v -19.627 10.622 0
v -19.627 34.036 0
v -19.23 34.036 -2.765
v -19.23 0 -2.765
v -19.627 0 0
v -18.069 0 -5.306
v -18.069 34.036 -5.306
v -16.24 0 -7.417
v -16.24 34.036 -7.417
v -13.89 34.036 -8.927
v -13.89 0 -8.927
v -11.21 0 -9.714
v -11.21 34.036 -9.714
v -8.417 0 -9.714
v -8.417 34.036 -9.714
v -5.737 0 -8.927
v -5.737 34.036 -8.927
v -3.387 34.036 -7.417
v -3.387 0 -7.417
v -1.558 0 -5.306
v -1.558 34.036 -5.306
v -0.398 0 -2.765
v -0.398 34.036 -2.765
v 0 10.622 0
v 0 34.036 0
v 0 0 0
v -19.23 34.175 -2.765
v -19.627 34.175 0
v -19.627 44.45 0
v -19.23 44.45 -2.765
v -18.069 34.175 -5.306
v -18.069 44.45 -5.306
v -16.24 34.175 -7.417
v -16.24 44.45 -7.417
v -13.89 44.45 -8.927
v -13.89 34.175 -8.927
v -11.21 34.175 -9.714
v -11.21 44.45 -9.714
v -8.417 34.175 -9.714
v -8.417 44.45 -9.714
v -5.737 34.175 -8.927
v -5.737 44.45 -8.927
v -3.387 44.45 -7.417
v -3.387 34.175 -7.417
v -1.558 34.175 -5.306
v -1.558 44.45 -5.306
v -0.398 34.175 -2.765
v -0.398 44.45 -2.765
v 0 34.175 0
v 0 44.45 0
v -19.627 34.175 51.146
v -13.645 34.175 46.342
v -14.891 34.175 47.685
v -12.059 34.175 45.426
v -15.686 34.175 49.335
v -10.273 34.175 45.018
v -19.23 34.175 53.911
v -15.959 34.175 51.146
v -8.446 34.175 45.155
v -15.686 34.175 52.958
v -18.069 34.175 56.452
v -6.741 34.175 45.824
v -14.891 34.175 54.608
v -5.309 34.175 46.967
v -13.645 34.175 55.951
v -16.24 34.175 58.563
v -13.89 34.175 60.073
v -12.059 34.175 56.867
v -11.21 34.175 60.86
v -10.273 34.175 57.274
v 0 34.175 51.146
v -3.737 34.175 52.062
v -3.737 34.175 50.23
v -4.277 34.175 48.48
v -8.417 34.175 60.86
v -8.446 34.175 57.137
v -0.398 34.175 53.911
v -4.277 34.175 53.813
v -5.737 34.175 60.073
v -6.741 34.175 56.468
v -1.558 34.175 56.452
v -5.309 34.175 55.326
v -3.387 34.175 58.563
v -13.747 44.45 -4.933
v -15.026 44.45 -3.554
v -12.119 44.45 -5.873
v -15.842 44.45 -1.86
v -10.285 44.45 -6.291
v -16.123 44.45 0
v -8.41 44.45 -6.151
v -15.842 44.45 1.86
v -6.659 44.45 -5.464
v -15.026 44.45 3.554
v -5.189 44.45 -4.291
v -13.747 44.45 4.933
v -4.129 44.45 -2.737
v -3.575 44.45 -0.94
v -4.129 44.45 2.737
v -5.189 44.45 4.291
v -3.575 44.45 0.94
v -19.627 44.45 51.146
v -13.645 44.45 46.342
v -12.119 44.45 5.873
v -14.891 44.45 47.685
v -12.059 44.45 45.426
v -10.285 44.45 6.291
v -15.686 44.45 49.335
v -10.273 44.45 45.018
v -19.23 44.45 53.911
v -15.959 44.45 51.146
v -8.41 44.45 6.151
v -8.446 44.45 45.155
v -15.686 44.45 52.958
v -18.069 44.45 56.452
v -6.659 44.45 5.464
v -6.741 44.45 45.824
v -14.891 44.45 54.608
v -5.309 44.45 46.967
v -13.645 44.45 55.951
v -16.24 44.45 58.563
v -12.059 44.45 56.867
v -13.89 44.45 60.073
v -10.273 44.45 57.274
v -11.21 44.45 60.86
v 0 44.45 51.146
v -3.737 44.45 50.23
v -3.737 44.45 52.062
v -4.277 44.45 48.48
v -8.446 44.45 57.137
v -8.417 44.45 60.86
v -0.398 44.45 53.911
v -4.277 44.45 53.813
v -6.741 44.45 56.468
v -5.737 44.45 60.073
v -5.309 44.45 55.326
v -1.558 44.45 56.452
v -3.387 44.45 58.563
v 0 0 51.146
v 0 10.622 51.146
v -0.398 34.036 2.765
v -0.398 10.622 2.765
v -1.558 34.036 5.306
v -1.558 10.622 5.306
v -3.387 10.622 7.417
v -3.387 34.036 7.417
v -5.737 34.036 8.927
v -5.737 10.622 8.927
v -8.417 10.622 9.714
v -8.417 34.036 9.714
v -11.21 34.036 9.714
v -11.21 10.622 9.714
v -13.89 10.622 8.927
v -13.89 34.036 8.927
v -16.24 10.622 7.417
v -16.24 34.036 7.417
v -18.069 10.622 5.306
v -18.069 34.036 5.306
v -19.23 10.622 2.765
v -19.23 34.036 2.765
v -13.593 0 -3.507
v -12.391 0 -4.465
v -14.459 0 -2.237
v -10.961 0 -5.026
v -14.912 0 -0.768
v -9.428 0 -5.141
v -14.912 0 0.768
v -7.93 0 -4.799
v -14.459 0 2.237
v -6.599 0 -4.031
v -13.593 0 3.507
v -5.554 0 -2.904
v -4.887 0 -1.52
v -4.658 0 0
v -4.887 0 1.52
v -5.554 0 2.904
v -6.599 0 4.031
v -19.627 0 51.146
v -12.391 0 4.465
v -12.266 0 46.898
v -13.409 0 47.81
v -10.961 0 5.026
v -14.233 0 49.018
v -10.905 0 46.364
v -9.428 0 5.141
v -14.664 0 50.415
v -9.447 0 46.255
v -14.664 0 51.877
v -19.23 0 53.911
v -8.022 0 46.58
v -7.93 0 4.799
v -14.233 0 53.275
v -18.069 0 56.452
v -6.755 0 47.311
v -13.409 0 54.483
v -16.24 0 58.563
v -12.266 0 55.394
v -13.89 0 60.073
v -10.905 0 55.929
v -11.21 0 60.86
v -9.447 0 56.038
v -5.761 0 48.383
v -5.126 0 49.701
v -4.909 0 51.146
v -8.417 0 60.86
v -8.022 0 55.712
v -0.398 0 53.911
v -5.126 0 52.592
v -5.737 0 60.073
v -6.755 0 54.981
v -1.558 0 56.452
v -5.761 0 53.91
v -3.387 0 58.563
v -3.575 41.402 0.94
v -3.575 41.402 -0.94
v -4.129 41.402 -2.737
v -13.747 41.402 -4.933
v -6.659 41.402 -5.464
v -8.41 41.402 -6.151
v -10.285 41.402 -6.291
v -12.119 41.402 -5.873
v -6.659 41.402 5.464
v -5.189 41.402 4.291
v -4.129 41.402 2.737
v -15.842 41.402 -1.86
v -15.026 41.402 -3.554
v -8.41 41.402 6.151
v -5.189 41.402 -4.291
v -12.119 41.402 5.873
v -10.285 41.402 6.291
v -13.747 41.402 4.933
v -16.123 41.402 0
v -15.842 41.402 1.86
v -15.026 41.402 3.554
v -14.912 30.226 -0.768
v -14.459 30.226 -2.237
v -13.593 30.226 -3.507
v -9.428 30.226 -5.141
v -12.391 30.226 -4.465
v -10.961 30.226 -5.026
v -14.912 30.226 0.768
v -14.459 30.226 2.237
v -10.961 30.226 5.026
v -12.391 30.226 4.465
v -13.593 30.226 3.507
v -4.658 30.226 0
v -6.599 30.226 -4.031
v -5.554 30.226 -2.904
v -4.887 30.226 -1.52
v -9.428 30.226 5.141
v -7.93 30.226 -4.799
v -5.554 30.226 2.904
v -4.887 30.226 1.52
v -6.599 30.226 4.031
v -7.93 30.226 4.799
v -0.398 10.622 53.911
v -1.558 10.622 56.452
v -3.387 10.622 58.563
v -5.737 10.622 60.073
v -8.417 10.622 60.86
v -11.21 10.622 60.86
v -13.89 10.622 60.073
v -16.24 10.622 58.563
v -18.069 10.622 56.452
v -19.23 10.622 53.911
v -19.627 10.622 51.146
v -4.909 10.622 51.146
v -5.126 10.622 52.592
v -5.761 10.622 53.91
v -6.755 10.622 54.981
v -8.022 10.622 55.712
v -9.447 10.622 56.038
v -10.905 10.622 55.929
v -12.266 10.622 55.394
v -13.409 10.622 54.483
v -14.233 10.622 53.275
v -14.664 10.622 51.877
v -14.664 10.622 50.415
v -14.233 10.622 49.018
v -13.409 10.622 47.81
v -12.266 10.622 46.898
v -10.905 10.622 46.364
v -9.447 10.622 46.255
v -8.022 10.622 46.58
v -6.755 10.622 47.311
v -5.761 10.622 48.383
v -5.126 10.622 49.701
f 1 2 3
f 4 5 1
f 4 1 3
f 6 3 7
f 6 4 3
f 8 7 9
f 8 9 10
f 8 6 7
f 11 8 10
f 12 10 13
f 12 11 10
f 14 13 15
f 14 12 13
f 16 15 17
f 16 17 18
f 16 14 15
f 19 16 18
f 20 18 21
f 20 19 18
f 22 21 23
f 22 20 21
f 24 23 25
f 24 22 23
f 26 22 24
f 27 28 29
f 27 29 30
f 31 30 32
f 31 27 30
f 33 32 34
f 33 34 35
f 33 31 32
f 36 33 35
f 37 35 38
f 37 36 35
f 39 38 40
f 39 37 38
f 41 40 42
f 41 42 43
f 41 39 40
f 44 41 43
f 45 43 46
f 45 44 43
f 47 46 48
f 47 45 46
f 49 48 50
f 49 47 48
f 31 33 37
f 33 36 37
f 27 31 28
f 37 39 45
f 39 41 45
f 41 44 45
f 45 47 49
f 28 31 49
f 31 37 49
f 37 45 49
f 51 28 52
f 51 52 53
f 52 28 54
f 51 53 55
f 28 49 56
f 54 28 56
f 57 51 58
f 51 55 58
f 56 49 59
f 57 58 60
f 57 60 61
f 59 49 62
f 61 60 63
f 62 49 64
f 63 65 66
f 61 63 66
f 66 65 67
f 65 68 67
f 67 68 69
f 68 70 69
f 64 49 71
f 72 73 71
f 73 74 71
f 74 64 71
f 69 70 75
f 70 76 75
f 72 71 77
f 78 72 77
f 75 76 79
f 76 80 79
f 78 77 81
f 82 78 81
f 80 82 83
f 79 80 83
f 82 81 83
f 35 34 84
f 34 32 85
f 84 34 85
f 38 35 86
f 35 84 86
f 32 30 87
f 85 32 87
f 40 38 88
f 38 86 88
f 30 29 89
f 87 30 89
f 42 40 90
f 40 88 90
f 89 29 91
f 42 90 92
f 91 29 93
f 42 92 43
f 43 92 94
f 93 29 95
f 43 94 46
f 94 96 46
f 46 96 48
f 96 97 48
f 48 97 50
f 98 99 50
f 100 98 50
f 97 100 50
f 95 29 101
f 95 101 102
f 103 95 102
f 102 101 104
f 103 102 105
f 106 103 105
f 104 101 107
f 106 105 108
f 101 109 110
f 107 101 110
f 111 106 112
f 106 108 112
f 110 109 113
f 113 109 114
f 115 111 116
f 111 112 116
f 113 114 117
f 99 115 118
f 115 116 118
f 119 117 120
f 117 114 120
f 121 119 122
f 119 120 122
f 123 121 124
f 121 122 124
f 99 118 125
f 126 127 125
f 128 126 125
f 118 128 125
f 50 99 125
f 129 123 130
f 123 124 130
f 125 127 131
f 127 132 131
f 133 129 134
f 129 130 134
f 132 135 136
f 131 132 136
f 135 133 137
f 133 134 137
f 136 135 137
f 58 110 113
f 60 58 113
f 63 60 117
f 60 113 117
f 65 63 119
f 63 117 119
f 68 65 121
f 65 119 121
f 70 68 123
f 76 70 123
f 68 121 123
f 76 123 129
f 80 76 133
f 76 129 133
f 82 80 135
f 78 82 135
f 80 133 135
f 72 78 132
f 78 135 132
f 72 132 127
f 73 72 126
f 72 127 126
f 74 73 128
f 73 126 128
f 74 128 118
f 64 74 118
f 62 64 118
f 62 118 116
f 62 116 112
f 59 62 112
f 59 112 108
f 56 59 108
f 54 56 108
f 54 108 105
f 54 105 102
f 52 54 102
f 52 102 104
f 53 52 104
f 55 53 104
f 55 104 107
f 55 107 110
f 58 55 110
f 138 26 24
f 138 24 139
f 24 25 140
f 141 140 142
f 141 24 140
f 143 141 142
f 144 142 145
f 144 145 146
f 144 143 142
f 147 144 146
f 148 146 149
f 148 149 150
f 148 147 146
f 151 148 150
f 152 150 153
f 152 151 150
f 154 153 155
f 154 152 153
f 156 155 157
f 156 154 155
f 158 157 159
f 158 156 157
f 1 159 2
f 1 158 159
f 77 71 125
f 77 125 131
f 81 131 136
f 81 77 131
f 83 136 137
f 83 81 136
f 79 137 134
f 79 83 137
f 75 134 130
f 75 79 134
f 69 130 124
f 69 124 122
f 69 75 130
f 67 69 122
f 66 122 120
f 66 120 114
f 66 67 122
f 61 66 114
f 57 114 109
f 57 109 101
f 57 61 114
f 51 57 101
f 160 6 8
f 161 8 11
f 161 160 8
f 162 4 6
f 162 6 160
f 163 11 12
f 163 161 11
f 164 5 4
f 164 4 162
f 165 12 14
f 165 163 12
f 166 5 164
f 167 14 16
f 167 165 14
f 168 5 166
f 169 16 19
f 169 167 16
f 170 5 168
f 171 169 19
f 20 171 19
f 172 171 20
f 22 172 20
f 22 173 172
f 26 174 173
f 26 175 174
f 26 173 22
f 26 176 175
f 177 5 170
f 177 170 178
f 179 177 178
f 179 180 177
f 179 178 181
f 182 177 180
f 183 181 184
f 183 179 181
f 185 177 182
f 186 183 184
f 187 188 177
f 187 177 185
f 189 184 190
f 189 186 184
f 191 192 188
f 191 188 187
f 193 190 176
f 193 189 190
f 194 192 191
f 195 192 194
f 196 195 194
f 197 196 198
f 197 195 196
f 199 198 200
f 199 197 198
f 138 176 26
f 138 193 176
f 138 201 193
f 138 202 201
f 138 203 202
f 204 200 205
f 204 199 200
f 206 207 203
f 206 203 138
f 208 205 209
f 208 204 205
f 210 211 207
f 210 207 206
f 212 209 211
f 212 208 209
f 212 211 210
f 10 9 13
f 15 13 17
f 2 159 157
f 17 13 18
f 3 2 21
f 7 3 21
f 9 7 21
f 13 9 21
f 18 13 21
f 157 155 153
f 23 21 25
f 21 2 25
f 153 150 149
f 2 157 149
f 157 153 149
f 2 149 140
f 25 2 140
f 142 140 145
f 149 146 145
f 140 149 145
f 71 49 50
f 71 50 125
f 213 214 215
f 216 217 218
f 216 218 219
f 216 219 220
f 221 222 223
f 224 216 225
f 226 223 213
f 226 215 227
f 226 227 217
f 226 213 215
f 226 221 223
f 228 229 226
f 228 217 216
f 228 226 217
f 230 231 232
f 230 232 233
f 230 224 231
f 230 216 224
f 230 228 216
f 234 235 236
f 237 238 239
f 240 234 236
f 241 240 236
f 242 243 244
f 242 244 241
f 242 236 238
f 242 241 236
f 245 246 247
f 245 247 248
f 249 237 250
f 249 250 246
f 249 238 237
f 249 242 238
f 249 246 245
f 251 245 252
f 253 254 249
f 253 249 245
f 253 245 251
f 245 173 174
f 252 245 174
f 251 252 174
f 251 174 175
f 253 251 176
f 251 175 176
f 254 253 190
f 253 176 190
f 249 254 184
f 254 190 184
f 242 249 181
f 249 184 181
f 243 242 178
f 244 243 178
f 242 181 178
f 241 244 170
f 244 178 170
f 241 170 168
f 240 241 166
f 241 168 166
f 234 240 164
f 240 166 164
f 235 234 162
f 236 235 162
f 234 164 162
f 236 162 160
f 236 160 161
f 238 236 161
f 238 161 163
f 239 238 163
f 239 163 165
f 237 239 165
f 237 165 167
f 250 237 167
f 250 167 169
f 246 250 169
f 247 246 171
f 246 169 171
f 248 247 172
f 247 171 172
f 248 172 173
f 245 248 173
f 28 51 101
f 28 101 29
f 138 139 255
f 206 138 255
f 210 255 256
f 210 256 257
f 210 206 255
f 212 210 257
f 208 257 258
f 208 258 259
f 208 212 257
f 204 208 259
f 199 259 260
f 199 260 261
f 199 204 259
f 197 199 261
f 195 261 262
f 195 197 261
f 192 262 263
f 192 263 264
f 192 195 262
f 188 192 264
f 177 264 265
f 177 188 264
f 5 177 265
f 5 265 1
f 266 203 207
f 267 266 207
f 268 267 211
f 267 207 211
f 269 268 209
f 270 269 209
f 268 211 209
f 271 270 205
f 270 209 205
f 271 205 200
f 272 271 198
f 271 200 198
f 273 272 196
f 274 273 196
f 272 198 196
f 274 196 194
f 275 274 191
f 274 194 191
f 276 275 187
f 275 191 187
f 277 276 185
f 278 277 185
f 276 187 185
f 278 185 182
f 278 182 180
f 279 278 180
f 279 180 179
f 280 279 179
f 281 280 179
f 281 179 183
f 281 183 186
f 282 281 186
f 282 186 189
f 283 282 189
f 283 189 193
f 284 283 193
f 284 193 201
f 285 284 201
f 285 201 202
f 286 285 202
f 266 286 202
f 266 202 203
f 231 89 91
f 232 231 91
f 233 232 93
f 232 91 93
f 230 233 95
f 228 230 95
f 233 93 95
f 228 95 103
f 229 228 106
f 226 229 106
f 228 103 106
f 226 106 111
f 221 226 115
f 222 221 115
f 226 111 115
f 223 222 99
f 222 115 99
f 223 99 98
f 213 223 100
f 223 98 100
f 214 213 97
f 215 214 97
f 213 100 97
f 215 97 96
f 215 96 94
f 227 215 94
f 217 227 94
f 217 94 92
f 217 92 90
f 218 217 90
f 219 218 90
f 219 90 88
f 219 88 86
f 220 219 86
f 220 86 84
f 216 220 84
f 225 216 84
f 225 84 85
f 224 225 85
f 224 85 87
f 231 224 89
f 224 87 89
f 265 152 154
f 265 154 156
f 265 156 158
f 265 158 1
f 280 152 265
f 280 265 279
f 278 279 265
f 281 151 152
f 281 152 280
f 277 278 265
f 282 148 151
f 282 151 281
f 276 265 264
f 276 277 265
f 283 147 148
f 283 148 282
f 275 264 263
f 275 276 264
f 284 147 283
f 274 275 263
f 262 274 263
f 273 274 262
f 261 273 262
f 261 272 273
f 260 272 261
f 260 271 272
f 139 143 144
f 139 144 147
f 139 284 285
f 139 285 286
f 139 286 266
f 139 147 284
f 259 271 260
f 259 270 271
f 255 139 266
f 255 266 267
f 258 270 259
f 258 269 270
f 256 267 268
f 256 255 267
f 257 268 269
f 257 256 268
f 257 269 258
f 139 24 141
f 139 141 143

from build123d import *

# Parameters (mm, degrees)
F1_DEPTH  = 44.45
F2_W      = 23.552729
F2_H      = 77.123636
F3_DEPTH  = 101.6
F4_R      = 4.905121
F5_DEPTH  = 74.93
F7_DEPTH  = 34.036
F8_R      = 5.155534
F9_DEPTH  = 30.226
F10_R     = 6.145174
F10_R_2   = 4.905121
F11_DEPTH = 23.622
F12_R     = 6.308934
F13_DEPTH = 3.048


with BuildPart() as f1:
    # F0 (on Front) → F1 (new body)
    with BuildSketch(Plane.XZ):
        with BuildLine():
            ThreePointArc((-19.627273, 0), (-9.813637, -9.813637), (0, 0))
            Line((0, 0), (0, 51.146362))
            ThreePointArc((0, 51.146362), (-9.813637, 60.959999), (-19.627273, 51.146362))
            Line((-19.627273, 51.146362), (-19.627273, 0))
        make_face()
    extrude(amount=-F1_DEPTH)

    # F2 (on Right) → F3 (cut)
    with BuildSketch(Plane.YZ):
        with Locations((22.398182, 25.515455)):
            Rectangle(F2_W, F2_H)
    extrude(amount=-F3_DEPTH, mode=Mode.SUBTRACT)

    # F4 (on face) → F5 (cut)
    with BuildSketch(Plane.XZ):
        with Locations((-9.813637, 51.146362)):
            Circle(F4_R)
    extrude(amount=-F5_DEPTH, mode=Mode.SUBTRACT)

    # F6 (on face) → F7 (join)
    with BuildSketch(Plane.XZ):
        with BuildLine():
            ThreePointArc((-19.627273, 0), (-9.813637, -9.813637), (0, 0))
            ThreePointArc((0, 0), (-9.813637, 9.813637), (-19.627273, 0))
        make_face()
    extrude(amount=-F7_DEPTH)

    # F8 (on face) → F9 (cut)
    with BuildSketch(Plane.XZ):
        with Locations((-9.813637, 0)):
            Circle(F8_R)
    extrude(amount=-F9_DEPTH, mode=Mode.SUBTRACT)

    # F10 (on face) → F11 (cut)
    with BuildSketch(Plane(origin=(0, 44.45, 0), x_dir=(-1, 0, 0), z_dir=(0, 1, 0))):
        with Locations((9.813637, 51.146362)):
            Circle(F10_R)
        with Locations((9.813637, 51.146362)):
            Circle(F10_R_2, mode=Mode.SUBTRACT)
    extrude(amount=-F11_DEPTH, mode=Mode.SUBTRACT)

    # F12 (on face) → F13 (cut)
    with BuildSketch(Plane(origin=(0, 44.45, 0), x_dir=(-1, 0, 0), z_dir=(0, 1, 0))):
        with Locations((9.813637, 0)):
            Circle(F12_R)
    extrude(amount=-F13_DEPTH, mode=Mode.SUBTRACT)


solid = f1.part
